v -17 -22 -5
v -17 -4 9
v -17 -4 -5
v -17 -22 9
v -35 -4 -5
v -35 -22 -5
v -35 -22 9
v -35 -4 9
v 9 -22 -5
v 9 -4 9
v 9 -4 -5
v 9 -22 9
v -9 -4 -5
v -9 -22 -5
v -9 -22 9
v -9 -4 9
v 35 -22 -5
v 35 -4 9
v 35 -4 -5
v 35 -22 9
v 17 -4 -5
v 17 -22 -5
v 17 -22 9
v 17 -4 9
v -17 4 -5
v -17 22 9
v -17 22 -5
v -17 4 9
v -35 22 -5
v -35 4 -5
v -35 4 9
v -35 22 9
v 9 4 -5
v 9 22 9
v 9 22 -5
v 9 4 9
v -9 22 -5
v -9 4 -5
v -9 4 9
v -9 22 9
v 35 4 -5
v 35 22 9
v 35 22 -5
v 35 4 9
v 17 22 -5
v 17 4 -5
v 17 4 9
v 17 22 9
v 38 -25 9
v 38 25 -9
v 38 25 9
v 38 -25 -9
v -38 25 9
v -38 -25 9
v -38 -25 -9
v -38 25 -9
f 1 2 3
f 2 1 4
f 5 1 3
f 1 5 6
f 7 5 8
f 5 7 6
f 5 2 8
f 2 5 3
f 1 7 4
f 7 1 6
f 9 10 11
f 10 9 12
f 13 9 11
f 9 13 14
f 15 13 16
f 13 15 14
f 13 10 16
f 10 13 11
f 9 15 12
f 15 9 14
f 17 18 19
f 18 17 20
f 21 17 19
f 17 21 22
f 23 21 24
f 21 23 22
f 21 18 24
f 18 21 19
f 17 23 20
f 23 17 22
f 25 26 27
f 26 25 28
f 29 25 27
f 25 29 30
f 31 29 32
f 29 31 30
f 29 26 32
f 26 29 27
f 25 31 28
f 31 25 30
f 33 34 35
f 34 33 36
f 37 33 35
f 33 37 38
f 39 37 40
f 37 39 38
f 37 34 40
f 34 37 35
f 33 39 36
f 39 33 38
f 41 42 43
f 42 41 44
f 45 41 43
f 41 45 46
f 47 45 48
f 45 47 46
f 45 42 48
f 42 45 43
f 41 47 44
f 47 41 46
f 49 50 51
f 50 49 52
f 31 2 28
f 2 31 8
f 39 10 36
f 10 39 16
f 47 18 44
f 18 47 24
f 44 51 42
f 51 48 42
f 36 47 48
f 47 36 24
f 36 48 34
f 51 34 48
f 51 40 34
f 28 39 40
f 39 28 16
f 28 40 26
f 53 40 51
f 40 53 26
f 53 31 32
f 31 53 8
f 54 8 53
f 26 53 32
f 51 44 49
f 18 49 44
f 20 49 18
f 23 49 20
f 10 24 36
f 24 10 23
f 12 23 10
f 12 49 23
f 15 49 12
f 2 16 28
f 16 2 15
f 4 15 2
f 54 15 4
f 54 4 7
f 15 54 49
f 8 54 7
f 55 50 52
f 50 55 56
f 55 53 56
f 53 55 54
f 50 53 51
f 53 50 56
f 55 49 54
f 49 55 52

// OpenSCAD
$fn = 32;

// ----------------------------------------------------------------------
// Pocket plate 76 x 50 x 18
// 2 x 3 pockets 18 mm square, 14 mm deep
// ----------------------------------------------------------------------

// --- parameters (mm) ---
thickness = 18;  // plate thickness
floor_t = 4;     // material left under each pocket
pocket = 18;     // pocket side length
pitch_x = 26;    // pocket pitch along X
pitch_y = 26;    // pocket pitch along Y
cols = 3;        // pockets per row
rows = 2;        // rows of pockets

// --- derived feature positions (mm) ---
depth = thickness - floor_t;        // = 14   pocket depth, down to the floor
span_x = (cols - 1) * pitch_x;      // = 52   distance between outer pockets
span_y = (rows - 1) * pitch_y;      // = 26   distance between outer pocket rows
origin_x = -span_x / 2;             // = -26   X of the first pocket
origin_y = -span_y / 2;             // = -13   Y of the first pocket
plate = [span_x + pocket + 6, span_y + pocket + 6, thickness];  // = [76, 50, 18]   overall size: pockets plus 3 mm of wall on each side
feature_centers = [
  [origin_x + 0 * pitch_x, origin_y + 0 * pitch_y],
  [origin_x + 1 * pitch_x, origin_y + 0 * pitch_y],
  [origin_x + 2 * pitch_x, origin_y + 0 * pitch_y],
  [origin_x + 0 * pitch_x, origin_y + 1 * pitch_y],
  [origin_x + 1 * pitch_x, origin_y + 1 * pitch_y],
  [origin_x + 2 * pitch_x, origin_y + 1 * pitch_y]
];   // pocket centres, used verbatim by the cutter loop

// plate outline, then one pocket per centre in feature_centers
difference() {
  cube(plate, center = true);
  for (centre = feature_centers)
    translate([centre[0] - pocket / 2, centre[1] - pocket / 2, plate[2] / 2 - depth])
      cube([pocket, pocket, depth + 1]);  // centred on the declared pocket centre
}
